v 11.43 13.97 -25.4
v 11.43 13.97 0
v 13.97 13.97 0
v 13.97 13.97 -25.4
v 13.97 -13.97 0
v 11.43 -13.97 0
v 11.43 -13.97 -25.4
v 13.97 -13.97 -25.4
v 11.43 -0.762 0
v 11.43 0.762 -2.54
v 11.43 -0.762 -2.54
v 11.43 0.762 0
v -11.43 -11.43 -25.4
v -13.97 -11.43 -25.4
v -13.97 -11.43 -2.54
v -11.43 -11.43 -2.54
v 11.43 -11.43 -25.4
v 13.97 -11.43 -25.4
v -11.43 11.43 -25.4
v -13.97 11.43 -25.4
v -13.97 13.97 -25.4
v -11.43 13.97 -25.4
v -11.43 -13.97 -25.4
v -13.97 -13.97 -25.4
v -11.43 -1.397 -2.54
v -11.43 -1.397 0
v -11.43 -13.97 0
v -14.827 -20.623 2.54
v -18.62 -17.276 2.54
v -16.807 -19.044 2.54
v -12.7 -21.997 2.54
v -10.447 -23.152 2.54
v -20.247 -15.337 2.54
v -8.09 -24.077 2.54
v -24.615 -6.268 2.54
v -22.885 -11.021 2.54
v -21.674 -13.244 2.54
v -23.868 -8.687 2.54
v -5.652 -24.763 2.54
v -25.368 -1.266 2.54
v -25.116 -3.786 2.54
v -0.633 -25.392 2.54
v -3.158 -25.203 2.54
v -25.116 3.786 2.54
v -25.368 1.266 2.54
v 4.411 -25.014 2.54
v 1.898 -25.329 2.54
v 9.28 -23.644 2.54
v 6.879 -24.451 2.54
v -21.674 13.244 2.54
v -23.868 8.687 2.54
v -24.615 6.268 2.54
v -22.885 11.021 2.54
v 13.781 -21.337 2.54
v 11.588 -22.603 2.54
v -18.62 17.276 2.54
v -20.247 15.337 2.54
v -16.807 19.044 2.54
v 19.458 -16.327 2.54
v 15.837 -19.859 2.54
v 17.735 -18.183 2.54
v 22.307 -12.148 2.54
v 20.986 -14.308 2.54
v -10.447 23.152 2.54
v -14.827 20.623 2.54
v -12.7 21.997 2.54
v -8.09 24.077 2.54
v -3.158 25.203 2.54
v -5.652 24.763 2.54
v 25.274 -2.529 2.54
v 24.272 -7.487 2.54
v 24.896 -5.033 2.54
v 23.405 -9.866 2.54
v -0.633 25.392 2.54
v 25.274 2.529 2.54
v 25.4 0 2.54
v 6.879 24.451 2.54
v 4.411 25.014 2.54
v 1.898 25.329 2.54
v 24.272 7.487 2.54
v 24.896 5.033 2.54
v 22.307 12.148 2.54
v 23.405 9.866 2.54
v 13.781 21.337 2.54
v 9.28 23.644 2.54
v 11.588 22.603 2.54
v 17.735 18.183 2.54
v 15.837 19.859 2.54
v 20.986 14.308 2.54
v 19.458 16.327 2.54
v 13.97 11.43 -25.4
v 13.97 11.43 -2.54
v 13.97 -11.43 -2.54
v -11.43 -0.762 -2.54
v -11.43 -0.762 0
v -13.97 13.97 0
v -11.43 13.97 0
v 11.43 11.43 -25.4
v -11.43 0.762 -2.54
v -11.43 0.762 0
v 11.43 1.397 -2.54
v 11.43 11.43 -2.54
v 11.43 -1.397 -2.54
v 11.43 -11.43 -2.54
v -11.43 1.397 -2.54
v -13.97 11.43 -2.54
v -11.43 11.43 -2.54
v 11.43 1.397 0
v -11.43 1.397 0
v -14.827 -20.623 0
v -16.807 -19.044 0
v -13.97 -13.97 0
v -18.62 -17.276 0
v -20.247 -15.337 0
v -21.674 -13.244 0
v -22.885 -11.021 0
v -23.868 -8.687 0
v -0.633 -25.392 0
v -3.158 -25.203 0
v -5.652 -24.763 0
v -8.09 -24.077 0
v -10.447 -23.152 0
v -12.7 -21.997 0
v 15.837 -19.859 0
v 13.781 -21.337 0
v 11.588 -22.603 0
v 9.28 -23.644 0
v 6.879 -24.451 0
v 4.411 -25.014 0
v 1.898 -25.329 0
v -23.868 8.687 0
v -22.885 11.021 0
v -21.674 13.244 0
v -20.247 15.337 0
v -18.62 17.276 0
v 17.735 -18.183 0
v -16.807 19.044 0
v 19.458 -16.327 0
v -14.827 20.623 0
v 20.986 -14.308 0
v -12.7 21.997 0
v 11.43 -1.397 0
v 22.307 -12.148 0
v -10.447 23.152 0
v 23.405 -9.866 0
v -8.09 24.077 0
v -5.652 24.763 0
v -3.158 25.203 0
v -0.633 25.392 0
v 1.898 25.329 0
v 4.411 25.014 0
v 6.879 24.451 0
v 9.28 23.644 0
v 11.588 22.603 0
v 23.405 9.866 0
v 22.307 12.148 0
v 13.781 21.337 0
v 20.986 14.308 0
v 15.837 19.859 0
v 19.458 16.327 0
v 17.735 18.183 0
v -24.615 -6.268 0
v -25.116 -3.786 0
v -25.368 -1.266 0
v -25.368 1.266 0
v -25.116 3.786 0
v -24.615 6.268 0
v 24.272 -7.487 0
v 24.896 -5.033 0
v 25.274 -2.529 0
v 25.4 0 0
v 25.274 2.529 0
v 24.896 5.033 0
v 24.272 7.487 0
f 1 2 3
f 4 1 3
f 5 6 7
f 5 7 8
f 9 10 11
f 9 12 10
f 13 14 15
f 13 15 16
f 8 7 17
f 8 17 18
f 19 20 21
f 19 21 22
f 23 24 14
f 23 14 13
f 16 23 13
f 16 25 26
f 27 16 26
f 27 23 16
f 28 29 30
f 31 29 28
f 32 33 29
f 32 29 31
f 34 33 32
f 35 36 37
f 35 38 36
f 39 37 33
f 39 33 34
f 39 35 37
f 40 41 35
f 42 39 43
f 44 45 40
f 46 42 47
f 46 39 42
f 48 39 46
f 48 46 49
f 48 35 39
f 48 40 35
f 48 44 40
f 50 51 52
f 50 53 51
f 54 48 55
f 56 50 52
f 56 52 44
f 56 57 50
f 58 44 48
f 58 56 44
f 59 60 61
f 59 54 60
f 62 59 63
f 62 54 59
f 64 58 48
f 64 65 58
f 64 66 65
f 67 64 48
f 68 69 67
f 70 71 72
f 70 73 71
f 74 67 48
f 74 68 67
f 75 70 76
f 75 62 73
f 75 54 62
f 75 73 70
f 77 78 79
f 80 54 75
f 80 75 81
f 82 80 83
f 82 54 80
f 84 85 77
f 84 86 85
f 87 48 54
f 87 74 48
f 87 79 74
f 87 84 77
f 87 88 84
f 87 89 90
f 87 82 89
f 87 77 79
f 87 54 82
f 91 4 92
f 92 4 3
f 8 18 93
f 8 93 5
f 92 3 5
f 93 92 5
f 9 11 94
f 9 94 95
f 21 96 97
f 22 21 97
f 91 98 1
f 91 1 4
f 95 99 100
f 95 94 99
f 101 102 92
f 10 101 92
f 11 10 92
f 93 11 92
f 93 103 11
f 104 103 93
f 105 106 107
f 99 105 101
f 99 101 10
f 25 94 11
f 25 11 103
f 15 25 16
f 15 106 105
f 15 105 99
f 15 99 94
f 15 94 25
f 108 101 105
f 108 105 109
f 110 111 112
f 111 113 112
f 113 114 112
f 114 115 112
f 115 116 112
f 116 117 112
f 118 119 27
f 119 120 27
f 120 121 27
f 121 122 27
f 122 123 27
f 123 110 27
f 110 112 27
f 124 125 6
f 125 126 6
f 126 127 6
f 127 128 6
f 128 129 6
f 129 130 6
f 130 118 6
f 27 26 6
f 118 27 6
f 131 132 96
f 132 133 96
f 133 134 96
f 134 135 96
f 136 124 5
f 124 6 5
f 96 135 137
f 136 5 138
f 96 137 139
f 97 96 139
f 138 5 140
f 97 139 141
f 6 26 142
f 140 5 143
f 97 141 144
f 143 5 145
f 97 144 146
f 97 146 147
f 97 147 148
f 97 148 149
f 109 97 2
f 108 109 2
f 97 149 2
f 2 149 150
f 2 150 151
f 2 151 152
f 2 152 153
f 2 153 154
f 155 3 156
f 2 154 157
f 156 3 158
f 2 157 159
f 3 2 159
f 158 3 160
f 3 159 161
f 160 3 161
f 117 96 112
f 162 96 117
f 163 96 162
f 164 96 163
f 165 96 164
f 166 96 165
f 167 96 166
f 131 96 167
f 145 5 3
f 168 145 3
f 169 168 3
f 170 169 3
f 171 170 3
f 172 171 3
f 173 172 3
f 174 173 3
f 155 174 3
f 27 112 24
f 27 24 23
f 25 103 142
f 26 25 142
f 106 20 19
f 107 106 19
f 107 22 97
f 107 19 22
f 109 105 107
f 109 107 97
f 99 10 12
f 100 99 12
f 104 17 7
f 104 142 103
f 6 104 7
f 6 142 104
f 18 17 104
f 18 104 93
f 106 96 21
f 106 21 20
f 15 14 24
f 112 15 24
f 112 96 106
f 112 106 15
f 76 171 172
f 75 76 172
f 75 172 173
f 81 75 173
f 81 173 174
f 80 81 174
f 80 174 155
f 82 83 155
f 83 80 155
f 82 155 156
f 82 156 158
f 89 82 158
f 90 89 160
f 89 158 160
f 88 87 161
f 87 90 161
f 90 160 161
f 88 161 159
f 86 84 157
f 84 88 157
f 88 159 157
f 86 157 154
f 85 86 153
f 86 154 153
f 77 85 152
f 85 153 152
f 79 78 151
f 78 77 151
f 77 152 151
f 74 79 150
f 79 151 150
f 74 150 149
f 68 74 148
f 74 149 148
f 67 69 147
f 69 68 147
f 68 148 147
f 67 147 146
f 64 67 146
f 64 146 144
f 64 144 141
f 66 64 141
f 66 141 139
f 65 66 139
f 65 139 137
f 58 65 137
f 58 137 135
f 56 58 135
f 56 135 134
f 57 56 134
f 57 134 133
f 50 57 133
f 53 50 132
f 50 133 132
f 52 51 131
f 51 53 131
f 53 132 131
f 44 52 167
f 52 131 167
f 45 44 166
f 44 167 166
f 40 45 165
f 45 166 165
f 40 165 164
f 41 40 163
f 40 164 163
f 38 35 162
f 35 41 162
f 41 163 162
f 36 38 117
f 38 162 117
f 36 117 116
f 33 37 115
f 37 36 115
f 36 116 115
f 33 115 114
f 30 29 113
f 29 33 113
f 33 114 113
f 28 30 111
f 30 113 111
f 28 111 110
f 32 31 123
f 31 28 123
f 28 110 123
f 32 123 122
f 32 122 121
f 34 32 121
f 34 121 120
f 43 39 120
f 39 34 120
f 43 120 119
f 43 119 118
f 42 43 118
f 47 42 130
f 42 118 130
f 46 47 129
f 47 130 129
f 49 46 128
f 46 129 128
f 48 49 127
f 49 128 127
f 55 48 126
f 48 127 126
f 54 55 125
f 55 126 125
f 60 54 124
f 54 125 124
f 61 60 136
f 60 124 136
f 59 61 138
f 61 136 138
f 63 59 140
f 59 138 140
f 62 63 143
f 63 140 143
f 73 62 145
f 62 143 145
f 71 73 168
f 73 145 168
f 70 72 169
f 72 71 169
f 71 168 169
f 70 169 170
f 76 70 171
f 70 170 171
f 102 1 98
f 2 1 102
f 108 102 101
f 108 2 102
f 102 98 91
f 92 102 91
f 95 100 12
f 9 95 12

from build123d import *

# Parameters (mm, degrees)
F0_R     = 25.4
F1_DEPTH = 2.54
F2_W     = 2.54
F2_H     = 2.54
F3_DEPTH = 25.4
F4_W     = 2.54
F4_H     = 2.54
F5_DEPTH = 25.4
F7_W     = 0.635
F7_H     = 2.54
F8_DEPTH = 25.4


with BuildPart() as f1:
    # F0 (on Top) → F1 (new body)
    with BuildSketch(Plane.XY):
        Circle(F0_R)
    extrude(amount=F1_DEPTH)

    # F2 (on face) → F3 (join)
    with BuildSketch(Plane(origin=(0, 0, 0), x_dir=(1, 0, 0), z_dir=(0, 0, -1))):
        with Locations((12.7, -12.7)):
            Rectangle(F2_W, F2_H)
        with Locations((-12.7, -12.7)):
            Rectangle(F2_W, F2_H)
        with Locations((-12.7, 12.7)):
            Rectangle(F2_W, F2_H)
        with Locations((12.7, 12.7)):
            Rectangle(F2_W, F2_H)
    extrude(amount=F3_DEPTH)

    # F4 (on face) → F5 (join)
    with BuildSketch(Plane(origin=(0, -11.43, 0), x_dir=(-1, 0, 0), z_dir=(0, 1, 0))):
        with Locations((12.7, -1.27)):
            Rectangle(F4_W, F4_H)
    extrude(amount=F5_DEPTH)

    # F6: F1 across plane


with BuildPart() as f1_1:
    add(f1.part)
    add(f1.part.mirror(Plane.YZ))

    # F7 (on face) → F8 (join)
    with BuildSketch(Plane.YZ.offset(-11.43)):
        with Locations((-1.0795, -1.27)):
            Rectangle(F7_W, F7_H)
    extrude(amount=F8_DEPTH)

    # F9: F1 across plane


with BuildPart() as f1_2:
    add(f1_1.part)
    add(f1_1.part.mirror(Plane.XZ))


solid = f1_2.part
